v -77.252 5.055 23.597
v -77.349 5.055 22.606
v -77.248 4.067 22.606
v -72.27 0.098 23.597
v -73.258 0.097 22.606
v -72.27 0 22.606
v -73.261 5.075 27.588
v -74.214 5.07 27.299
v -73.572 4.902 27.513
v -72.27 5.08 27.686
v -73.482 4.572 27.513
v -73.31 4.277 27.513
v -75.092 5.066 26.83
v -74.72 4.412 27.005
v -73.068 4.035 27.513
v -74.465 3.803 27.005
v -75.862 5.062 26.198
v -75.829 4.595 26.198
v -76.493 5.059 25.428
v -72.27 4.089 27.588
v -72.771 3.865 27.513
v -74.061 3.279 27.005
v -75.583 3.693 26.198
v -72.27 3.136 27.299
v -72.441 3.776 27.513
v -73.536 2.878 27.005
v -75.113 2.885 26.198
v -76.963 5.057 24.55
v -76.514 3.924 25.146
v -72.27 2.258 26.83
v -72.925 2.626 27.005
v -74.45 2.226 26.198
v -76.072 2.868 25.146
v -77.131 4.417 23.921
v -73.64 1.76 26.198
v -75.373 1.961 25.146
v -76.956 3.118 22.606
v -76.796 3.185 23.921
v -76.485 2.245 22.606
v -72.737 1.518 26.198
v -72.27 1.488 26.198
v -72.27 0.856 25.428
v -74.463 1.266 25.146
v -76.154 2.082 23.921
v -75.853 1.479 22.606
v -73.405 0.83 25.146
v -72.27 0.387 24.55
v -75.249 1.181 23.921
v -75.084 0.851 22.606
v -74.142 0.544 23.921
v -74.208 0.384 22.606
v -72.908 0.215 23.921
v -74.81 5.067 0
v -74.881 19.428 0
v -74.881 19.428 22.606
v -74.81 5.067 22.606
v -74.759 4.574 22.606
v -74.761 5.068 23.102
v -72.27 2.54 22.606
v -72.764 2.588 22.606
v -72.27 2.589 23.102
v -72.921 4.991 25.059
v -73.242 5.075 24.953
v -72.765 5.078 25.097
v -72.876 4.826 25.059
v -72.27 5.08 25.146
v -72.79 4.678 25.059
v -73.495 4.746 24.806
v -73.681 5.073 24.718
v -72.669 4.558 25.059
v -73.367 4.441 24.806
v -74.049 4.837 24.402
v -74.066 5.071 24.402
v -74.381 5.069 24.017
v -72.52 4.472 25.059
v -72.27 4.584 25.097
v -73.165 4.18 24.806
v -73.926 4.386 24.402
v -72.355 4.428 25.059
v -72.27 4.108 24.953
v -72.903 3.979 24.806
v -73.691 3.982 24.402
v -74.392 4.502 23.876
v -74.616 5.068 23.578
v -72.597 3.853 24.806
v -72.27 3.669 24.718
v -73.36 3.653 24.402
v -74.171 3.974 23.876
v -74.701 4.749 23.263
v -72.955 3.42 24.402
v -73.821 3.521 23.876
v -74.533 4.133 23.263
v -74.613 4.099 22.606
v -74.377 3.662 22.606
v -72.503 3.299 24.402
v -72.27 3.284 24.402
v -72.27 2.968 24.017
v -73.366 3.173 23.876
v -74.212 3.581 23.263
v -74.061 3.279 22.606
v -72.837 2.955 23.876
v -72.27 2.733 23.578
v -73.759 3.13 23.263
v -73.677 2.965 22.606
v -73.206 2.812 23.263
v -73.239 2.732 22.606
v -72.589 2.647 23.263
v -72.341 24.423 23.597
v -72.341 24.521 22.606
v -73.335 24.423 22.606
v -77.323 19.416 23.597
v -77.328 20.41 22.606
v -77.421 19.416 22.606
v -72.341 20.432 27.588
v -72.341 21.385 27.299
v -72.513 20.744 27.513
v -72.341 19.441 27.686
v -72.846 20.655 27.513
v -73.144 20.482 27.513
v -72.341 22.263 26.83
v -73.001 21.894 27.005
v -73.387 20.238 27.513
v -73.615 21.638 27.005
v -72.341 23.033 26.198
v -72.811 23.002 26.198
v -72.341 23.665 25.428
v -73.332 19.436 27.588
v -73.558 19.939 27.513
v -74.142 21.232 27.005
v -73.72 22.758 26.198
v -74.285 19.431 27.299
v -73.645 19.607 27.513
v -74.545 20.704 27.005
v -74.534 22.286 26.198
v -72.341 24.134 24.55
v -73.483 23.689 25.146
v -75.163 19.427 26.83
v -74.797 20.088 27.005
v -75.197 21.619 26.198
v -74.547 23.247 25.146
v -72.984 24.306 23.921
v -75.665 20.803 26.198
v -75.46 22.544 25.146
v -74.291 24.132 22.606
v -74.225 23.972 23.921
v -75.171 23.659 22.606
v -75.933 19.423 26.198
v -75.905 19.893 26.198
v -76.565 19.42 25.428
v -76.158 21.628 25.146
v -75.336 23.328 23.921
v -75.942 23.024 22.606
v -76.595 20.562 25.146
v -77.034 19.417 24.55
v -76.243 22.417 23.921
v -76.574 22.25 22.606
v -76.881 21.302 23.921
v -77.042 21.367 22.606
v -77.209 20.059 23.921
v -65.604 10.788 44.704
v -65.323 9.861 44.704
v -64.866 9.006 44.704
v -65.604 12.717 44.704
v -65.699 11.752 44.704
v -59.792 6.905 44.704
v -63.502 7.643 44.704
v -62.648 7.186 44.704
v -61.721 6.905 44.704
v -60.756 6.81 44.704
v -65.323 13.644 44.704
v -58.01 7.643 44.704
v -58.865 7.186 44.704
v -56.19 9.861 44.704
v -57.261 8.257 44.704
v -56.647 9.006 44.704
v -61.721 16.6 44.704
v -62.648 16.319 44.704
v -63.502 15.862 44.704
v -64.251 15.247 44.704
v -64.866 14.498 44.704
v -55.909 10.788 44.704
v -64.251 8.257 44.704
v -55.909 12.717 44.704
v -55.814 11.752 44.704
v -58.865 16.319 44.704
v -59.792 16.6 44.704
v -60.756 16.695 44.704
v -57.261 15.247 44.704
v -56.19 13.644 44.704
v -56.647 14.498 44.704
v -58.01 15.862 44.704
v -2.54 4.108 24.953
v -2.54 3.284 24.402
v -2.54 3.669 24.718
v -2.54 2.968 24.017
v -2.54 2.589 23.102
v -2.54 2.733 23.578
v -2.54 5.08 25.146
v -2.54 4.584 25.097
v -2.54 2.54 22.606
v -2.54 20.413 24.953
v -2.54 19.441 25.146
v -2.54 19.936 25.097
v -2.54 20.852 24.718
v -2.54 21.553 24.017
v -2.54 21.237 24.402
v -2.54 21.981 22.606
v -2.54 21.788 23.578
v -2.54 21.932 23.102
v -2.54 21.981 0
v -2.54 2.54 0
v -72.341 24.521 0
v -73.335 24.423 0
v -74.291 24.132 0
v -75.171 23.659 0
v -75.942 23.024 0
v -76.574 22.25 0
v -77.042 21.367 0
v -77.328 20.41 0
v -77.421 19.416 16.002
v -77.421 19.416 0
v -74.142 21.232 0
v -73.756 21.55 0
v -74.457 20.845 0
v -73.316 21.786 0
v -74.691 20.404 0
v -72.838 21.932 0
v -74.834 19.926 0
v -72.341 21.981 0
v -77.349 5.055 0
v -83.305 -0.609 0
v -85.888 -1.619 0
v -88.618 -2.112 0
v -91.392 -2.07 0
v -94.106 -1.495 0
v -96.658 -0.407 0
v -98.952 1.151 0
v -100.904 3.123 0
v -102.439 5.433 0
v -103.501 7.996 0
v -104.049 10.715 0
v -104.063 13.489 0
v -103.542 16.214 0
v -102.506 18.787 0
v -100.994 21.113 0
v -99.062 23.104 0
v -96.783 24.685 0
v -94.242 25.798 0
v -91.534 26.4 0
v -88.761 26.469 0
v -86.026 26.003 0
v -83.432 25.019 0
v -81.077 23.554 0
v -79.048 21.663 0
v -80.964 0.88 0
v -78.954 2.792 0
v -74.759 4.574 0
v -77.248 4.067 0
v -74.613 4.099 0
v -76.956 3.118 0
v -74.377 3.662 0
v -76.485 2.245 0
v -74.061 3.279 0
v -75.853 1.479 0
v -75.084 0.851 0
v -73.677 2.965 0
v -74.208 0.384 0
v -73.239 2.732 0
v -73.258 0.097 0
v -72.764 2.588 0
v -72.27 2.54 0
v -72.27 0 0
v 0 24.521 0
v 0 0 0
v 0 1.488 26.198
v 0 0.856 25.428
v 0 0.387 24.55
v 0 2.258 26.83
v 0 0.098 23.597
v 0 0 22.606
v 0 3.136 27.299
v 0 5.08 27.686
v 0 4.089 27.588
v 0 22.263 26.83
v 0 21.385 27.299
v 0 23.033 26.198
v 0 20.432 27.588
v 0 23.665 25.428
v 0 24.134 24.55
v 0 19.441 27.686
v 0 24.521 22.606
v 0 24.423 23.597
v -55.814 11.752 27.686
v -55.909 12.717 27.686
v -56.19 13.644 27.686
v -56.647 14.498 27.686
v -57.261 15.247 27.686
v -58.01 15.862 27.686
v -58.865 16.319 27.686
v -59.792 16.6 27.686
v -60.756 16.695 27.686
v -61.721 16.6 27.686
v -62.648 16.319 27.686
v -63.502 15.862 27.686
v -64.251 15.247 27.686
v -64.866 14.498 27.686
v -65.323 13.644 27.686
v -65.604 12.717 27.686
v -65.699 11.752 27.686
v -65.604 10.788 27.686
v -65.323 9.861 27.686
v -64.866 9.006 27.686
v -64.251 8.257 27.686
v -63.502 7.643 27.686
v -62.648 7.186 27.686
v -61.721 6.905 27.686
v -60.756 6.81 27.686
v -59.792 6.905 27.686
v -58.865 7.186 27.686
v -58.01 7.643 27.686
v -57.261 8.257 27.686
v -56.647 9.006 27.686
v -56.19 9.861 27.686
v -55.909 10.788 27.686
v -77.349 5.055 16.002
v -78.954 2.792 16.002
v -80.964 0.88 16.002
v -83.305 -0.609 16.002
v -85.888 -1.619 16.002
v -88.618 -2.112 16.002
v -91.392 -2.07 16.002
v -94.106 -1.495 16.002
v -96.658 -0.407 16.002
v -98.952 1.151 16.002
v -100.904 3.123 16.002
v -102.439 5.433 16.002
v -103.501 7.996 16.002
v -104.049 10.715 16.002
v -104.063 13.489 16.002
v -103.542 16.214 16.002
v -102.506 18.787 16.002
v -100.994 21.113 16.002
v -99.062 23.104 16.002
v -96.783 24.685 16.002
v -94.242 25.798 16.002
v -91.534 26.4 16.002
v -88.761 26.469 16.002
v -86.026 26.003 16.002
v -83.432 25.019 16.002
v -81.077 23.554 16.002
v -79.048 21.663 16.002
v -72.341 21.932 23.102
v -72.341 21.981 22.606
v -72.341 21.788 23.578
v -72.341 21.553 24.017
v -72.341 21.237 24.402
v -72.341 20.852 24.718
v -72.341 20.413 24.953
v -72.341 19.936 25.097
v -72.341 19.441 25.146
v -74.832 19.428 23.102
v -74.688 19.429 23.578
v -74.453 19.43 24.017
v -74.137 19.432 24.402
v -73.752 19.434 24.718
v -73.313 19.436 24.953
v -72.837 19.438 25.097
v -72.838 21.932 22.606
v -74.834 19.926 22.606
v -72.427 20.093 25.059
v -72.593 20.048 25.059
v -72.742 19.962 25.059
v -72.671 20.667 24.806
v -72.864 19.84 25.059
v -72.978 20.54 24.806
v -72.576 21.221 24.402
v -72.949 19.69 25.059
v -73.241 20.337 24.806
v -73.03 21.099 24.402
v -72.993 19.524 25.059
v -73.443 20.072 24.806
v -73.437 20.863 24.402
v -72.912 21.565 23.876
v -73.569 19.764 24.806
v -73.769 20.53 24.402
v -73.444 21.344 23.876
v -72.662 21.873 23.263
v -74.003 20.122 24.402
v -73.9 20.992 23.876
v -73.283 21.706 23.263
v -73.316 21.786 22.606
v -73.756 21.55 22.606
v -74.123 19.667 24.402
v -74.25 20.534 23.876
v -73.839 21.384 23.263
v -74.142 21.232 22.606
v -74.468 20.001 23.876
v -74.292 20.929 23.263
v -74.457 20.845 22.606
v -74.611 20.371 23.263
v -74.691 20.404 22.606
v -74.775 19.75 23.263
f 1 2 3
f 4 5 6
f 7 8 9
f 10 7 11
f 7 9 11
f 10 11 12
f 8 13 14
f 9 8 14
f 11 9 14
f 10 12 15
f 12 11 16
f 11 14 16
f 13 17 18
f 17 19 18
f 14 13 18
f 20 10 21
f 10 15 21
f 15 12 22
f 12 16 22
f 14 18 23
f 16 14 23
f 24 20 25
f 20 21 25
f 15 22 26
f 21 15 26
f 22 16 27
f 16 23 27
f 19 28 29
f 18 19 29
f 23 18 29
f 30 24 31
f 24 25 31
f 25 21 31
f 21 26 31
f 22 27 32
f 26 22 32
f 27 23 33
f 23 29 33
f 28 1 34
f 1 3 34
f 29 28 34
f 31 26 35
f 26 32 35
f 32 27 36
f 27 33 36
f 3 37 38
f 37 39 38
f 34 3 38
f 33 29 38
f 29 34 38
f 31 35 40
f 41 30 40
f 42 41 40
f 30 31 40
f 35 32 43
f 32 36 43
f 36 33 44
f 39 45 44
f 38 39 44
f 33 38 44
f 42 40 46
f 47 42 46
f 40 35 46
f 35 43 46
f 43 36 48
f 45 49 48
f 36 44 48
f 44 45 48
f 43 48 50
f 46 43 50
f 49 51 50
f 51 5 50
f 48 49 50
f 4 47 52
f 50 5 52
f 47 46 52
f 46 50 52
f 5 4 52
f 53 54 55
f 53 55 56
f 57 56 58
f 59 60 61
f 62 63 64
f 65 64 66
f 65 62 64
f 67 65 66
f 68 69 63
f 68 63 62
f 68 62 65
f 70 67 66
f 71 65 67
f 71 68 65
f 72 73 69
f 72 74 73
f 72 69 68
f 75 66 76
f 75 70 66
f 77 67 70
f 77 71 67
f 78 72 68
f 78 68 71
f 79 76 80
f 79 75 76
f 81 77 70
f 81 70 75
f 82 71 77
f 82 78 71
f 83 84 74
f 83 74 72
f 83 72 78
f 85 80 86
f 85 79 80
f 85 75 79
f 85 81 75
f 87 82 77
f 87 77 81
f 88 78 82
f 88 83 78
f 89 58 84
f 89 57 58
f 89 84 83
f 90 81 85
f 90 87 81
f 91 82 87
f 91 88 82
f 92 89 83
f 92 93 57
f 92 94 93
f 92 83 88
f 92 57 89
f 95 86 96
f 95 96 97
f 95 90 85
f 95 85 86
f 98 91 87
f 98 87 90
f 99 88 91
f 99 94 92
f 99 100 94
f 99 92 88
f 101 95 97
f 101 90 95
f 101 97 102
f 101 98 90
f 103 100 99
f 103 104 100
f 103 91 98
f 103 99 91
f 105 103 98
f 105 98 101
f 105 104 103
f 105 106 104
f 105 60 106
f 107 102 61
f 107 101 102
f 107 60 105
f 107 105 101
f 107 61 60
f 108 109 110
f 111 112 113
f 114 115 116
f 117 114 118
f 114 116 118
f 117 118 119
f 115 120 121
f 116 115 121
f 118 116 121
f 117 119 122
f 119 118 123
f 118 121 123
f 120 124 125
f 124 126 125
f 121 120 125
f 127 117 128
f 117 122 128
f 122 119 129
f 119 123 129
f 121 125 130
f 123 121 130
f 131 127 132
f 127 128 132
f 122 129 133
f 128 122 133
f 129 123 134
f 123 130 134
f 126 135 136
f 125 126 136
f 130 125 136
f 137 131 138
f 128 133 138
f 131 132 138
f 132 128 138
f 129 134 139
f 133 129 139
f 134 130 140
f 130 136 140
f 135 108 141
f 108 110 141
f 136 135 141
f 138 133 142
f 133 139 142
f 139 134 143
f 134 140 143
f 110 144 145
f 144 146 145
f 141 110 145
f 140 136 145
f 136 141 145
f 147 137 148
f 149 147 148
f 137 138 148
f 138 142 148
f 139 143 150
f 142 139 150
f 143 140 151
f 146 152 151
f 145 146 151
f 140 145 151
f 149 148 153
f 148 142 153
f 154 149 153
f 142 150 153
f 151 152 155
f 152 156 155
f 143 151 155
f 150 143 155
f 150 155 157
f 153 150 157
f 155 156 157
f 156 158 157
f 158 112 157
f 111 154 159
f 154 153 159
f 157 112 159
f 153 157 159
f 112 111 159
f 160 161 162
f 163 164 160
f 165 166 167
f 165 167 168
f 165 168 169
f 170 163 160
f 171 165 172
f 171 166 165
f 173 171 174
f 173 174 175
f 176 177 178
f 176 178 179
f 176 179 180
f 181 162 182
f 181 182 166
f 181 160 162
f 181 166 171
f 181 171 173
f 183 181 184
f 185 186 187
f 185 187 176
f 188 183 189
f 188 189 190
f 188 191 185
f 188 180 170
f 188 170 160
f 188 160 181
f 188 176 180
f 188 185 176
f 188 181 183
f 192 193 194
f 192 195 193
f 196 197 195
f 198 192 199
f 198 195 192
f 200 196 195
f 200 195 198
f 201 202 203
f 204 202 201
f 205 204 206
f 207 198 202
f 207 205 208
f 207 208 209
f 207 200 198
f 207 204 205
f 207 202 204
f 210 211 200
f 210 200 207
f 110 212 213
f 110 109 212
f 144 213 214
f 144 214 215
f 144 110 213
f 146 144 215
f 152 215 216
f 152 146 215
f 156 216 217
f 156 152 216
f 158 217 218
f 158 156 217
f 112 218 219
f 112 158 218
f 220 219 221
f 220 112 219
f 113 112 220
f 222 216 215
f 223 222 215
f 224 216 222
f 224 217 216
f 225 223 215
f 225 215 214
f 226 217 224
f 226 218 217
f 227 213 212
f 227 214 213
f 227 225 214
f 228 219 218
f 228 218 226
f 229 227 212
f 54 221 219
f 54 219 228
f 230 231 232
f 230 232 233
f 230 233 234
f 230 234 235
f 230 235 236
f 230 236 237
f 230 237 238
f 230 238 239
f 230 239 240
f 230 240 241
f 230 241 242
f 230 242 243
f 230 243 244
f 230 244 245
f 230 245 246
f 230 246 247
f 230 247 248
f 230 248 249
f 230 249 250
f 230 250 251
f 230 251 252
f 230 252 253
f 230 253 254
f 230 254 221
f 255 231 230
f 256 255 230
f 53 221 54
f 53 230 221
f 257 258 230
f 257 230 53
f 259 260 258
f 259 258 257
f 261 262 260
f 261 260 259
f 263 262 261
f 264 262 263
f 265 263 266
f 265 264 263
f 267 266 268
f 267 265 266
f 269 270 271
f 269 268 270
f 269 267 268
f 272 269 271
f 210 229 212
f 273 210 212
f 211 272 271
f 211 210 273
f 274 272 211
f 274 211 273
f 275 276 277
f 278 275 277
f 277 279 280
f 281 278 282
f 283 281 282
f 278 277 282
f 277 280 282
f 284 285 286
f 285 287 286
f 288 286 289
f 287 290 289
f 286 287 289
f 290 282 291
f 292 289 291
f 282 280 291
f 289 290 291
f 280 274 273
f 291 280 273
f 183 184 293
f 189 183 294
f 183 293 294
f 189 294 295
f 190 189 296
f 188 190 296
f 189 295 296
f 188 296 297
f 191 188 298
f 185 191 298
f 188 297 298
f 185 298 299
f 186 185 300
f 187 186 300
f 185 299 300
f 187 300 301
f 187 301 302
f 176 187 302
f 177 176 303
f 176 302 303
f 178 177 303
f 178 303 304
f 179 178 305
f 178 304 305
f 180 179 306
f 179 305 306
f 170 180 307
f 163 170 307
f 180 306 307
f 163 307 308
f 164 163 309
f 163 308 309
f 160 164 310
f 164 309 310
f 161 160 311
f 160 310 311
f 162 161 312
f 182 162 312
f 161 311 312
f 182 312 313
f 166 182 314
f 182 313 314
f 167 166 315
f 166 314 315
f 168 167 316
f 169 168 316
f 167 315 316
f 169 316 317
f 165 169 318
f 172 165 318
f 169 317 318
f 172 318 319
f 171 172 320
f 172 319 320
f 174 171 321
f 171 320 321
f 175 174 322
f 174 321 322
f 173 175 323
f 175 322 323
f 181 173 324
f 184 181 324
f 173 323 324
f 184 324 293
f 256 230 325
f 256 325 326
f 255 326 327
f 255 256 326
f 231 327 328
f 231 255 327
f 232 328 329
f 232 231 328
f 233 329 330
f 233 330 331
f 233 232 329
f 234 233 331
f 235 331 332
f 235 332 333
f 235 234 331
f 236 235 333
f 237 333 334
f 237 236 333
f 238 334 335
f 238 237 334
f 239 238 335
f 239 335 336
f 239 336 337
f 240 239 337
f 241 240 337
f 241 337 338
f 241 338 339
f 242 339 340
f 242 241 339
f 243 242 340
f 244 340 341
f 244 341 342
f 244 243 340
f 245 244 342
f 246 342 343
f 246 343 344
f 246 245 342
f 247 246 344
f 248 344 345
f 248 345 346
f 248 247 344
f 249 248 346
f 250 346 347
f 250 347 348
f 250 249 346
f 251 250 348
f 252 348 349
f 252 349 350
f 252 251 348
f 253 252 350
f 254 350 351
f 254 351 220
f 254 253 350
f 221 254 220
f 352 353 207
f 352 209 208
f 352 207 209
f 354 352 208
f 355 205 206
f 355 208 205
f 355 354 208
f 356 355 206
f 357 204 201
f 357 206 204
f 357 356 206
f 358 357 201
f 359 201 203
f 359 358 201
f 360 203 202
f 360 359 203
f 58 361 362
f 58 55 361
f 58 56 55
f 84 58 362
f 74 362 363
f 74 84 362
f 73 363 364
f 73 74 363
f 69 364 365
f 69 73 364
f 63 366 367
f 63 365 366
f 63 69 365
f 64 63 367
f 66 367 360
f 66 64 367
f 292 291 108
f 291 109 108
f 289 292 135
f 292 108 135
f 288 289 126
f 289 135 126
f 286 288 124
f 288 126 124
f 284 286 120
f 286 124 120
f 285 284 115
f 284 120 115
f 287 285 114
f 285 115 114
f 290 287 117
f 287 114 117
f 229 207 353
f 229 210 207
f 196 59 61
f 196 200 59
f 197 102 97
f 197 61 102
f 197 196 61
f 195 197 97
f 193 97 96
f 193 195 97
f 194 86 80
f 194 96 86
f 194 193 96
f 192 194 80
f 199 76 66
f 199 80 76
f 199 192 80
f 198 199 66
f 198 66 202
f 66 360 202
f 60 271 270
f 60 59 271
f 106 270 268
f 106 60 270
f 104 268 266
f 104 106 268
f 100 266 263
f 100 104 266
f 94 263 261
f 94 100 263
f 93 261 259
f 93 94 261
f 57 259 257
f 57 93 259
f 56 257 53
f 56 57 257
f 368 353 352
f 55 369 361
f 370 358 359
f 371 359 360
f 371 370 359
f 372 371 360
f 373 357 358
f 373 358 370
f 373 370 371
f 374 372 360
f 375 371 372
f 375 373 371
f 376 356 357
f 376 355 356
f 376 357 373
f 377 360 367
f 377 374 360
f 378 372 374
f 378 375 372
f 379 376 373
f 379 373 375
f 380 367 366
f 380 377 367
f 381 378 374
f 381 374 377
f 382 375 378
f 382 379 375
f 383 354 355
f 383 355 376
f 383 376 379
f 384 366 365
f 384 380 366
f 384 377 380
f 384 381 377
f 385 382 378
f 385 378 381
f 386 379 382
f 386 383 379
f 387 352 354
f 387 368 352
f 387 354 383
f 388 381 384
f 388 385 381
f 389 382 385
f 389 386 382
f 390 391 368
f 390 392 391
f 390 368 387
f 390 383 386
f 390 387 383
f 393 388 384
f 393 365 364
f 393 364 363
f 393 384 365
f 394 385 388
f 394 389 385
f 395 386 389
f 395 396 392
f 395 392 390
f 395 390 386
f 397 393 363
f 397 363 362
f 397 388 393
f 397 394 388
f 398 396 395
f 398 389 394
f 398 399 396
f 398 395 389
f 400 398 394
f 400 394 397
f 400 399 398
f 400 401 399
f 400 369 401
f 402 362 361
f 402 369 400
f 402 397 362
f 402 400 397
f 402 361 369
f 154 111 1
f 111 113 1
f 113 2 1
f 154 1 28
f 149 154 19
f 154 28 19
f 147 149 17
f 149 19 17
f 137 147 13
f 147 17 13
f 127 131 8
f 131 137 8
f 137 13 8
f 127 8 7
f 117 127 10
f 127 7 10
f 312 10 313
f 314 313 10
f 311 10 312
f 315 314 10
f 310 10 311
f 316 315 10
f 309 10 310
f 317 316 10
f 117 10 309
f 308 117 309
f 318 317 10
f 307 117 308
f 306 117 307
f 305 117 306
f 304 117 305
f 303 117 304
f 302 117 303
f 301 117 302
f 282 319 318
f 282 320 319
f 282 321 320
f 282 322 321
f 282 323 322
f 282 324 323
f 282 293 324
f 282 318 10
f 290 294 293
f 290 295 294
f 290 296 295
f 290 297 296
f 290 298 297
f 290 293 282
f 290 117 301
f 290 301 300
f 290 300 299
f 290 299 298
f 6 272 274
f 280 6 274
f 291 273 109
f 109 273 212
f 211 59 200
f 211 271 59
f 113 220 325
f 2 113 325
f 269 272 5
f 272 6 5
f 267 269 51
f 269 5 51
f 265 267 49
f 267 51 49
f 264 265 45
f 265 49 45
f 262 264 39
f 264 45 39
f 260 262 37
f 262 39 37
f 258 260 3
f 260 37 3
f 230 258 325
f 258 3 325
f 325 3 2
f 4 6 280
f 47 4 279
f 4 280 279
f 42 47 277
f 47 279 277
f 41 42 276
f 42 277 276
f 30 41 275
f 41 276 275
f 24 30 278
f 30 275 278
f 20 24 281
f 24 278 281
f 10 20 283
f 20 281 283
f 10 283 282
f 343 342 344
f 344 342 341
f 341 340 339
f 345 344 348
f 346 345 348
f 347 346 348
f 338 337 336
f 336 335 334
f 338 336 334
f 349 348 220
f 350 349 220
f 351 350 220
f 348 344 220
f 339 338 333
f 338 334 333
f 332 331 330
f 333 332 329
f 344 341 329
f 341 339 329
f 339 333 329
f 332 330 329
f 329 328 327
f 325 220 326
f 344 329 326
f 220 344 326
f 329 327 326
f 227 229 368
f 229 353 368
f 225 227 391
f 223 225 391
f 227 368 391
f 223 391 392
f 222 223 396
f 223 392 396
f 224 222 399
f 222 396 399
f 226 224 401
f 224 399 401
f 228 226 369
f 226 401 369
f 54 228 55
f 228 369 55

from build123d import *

# Parameters (mm, degrees)
F1_DEPTH = 27.686
F2_R     = 5.08
F3_T     = -2.54
F4_R     = 4.9426127615
F5_DEPTH = 17.018
F7_DEPTH = 16.002


with BuildPart() as f1:
    # F0 (on Top) → F1 (new body)
    with BuildSketch(Plane.XY):
        Polygon((-77.3243010044, 0), (0, 0), (0, 24.5208609849), (-77.4464830756, 24.5208609849), align=None)
    extrude(amount=F1_DEPTH)

    # F2
    f2_edges = [f1.edges().sort_by_distance(p)[0] for p in [
        (-77.446483, 24.520861, 13.843),
        (-38.723242, 24.520861, 27.686),
        (-77.385392, 12.26043, 27.686),
        (-38.662151, 0, 27.686),
        (-77.324301, 0, 13.843),
    ]]
    fillet(f2_edges, radius=F2_R)

    # F3
    f3_openings = [f1.faces().sort_by_distance(p)[0] for p in [
        (-38.472172, 12.262955, 0),
    ]]
    offset(amount=F3_T, openings=f3_openings)

    # F4 (on face) → F5 (join)
    with BuildSketch(Plane.XY.offset(27.686)):
        with Locations((-60.7563629746, 11.7522832006)):
            Circle(F4_R)
    extrude(amount=F5_DEPTH)

    # F6 (on face) → F7 (join)
    with BuildSketch(Plane(origin=(0, 0, 0), x_dir=(1, 0, 0), z_dir=(0, 0, -1))):
        with BuildLine():
            Line((-77.4210444248, -19.4155487735), (-77.3494874048, -5.0546877886))
            ThreePointArc((-77.3494874048, -5.0546877886), (-104.1229765697, -12.1018901343), (-77.4210444248, -19.4155487735))
        make_face()
    extrude(amount=-F7_DEPTH)


solid = f1.part
